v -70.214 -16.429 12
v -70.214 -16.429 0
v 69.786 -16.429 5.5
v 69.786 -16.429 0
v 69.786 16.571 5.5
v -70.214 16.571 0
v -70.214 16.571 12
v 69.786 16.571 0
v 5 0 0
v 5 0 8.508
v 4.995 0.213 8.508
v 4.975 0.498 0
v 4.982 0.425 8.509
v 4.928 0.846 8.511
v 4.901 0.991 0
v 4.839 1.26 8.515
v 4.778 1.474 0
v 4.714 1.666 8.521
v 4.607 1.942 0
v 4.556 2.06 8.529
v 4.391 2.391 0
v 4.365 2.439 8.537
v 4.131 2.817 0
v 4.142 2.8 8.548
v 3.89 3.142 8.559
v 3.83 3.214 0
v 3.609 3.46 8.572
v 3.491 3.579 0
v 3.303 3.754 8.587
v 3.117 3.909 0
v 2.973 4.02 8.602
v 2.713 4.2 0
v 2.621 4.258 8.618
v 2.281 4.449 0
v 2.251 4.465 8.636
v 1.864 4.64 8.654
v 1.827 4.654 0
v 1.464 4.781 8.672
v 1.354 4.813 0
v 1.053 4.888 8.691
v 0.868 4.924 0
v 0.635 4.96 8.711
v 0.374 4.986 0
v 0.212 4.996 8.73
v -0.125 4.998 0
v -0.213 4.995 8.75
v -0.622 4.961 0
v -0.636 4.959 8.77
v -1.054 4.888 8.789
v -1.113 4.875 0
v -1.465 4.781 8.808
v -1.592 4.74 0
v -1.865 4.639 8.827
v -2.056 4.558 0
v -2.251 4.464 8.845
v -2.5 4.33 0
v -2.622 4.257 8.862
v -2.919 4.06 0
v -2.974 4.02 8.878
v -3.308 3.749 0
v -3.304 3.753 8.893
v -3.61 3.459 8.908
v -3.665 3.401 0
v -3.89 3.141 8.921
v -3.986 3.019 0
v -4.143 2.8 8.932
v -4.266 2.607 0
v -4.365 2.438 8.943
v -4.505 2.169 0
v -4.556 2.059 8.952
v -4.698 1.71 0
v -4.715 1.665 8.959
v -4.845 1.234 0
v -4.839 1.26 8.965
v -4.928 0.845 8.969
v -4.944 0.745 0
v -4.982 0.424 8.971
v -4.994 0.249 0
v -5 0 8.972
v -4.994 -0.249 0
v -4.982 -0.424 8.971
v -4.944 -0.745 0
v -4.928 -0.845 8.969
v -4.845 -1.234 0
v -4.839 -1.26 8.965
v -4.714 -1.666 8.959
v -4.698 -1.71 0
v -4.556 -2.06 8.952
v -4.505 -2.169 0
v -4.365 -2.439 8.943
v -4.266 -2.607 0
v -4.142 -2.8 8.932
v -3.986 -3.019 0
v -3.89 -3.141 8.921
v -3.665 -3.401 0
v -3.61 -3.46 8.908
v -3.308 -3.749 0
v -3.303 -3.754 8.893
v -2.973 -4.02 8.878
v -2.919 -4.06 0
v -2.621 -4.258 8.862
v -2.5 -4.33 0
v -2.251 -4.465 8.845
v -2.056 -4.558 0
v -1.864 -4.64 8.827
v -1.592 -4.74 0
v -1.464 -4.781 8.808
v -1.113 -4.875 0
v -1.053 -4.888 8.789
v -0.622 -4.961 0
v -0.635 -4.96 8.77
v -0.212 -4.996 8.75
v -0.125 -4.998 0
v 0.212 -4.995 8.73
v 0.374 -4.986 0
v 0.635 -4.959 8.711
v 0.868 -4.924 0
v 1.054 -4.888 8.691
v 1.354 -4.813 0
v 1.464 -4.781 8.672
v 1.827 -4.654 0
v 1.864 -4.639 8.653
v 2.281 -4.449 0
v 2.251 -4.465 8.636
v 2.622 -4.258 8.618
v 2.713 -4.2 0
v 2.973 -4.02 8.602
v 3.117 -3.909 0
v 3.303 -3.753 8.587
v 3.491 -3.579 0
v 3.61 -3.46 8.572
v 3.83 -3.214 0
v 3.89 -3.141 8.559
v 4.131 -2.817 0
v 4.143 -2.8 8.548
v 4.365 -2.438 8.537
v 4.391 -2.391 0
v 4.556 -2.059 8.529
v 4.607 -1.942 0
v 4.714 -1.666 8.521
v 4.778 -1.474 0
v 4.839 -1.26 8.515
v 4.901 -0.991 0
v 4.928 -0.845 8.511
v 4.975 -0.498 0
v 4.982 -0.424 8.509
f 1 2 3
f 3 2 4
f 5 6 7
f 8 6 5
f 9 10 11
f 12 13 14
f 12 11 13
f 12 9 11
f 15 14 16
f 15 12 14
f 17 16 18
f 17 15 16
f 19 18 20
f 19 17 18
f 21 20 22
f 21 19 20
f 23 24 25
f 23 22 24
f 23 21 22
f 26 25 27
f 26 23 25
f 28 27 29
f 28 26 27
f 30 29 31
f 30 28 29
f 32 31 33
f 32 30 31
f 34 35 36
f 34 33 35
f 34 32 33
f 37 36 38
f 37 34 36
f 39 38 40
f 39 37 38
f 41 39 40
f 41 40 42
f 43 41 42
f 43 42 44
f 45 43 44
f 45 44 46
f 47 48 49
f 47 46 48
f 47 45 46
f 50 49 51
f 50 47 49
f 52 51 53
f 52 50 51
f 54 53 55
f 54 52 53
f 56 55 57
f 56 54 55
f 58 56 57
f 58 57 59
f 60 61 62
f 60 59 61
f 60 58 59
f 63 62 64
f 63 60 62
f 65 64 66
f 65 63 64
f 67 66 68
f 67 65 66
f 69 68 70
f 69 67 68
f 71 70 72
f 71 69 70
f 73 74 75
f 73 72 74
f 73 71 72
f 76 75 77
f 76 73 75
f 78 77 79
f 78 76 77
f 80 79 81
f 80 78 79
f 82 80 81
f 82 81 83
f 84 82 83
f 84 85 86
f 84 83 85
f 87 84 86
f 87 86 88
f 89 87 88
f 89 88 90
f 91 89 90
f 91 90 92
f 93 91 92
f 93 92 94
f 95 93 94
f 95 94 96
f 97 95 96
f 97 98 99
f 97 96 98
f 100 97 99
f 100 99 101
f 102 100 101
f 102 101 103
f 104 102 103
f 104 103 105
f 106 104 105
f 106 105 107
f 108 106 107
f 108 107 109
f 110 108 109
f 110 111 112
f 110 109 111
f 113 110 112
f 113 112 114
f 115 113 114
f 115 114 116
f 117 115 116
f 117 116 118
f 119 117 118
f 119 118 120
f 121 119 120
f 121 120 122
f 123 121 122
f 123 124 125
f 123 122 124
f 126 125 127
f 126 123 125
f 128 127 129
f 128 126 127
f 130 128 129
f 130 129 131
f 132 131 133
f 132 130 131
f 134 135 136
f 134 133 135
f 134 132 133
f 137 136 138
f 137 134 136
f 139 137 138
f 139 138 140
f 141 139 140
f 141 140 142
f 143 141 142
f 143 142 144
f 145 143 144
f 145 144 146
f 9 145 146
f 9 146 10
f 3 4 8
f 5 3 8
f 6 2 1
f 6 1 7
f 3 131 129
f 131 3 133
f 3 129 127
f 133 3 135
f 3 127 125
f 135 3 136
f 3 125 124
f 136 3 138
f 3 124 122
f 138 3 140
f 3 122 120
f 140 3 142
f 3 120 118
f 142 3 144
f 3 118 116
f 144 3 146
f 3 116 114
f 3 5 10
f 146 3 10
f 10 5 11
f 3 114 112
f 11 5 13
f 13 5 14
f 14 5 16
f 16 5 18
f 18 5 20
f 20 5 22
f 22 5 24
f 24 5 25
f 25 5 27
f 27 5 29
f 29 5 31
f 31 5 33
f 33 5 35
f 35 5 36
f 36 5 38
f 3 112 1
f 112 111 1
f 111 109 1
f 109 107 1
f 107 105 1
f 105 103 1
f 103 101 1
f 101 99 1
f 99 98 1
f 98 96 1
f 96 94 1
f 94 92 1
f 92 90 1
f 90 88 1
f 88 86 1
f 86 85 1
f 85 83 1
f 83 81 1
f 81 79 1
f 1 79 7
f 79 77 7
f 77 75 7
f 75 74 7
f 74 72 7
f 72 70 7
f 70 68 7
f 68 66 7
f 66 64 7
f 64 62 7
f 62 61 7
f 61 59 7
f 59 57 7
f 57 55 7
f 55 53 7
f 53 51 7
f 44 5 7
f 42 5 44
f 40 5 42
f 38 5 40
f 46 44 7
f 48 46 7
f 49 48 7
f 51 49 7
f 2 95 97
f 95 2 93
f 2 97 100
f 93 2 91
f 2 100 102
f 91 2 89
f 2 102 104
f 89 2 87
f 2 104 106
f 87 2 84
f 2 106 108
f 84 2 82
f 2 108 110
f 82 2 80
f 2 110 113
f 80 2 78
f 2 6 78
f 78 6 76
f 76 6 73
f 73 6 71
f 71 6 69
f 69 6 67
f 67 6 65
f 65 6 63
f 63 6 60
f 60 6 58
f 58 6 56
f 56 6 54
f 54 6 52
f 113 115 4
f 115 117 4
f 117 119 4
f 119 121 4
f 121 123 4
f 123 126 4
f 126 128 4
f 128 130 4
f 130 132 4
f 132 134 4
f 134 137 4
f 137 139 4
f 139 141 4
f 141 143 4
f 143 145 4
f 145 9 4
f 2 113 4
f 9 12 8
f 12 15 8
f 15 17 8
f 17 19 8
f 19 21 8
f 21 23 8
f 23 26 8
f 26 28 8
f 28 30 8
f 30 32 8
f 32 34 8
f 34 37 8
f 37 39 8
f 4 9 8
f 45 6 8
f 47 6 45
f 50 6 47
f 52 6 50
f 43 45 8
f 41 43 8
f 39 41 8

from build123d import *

# Parameters (mm, degrees)
F0_W        = 140
F0_H        = 33
F0_R        = 5
F1_DEPTH    = 12
F2_T1_DEPTH = 760.9710283957


# Not quite as in the source:
# - a fillet or chamfer that OpenCascade refuses, or shapes differently, is made with other operations: its cross-section is extruded or revolved along the edge and cut away or added


with BuildPart() as f1:
    # F0 (on Top) → F1 (new body)
    with BuildSketch(Plane.XY):
        with Locations((-0.2143342793, 0.0709771141)):
            Rectangle(F0_W, F0_H)
        Circle(F0_R, mode=Mode.SUBTRACT)
    extrude(amount=F1_DEPTH)

    # F2: chamfer of 6.5 x 140 on 1 edges, made by hand

    # F2_s2 → F2_t1 (cut)
    with BuildSketch(Plane.XZ.offset(-380.556491312)):
        Polygon((69.7856657207, 5.5), (-70.2143342793, 12), (69.7856657207, 12), align=None)
    extrude(amount=F2_T1_DEPTH, mode=Mode.SUBTRACT)


solid = f1.part
